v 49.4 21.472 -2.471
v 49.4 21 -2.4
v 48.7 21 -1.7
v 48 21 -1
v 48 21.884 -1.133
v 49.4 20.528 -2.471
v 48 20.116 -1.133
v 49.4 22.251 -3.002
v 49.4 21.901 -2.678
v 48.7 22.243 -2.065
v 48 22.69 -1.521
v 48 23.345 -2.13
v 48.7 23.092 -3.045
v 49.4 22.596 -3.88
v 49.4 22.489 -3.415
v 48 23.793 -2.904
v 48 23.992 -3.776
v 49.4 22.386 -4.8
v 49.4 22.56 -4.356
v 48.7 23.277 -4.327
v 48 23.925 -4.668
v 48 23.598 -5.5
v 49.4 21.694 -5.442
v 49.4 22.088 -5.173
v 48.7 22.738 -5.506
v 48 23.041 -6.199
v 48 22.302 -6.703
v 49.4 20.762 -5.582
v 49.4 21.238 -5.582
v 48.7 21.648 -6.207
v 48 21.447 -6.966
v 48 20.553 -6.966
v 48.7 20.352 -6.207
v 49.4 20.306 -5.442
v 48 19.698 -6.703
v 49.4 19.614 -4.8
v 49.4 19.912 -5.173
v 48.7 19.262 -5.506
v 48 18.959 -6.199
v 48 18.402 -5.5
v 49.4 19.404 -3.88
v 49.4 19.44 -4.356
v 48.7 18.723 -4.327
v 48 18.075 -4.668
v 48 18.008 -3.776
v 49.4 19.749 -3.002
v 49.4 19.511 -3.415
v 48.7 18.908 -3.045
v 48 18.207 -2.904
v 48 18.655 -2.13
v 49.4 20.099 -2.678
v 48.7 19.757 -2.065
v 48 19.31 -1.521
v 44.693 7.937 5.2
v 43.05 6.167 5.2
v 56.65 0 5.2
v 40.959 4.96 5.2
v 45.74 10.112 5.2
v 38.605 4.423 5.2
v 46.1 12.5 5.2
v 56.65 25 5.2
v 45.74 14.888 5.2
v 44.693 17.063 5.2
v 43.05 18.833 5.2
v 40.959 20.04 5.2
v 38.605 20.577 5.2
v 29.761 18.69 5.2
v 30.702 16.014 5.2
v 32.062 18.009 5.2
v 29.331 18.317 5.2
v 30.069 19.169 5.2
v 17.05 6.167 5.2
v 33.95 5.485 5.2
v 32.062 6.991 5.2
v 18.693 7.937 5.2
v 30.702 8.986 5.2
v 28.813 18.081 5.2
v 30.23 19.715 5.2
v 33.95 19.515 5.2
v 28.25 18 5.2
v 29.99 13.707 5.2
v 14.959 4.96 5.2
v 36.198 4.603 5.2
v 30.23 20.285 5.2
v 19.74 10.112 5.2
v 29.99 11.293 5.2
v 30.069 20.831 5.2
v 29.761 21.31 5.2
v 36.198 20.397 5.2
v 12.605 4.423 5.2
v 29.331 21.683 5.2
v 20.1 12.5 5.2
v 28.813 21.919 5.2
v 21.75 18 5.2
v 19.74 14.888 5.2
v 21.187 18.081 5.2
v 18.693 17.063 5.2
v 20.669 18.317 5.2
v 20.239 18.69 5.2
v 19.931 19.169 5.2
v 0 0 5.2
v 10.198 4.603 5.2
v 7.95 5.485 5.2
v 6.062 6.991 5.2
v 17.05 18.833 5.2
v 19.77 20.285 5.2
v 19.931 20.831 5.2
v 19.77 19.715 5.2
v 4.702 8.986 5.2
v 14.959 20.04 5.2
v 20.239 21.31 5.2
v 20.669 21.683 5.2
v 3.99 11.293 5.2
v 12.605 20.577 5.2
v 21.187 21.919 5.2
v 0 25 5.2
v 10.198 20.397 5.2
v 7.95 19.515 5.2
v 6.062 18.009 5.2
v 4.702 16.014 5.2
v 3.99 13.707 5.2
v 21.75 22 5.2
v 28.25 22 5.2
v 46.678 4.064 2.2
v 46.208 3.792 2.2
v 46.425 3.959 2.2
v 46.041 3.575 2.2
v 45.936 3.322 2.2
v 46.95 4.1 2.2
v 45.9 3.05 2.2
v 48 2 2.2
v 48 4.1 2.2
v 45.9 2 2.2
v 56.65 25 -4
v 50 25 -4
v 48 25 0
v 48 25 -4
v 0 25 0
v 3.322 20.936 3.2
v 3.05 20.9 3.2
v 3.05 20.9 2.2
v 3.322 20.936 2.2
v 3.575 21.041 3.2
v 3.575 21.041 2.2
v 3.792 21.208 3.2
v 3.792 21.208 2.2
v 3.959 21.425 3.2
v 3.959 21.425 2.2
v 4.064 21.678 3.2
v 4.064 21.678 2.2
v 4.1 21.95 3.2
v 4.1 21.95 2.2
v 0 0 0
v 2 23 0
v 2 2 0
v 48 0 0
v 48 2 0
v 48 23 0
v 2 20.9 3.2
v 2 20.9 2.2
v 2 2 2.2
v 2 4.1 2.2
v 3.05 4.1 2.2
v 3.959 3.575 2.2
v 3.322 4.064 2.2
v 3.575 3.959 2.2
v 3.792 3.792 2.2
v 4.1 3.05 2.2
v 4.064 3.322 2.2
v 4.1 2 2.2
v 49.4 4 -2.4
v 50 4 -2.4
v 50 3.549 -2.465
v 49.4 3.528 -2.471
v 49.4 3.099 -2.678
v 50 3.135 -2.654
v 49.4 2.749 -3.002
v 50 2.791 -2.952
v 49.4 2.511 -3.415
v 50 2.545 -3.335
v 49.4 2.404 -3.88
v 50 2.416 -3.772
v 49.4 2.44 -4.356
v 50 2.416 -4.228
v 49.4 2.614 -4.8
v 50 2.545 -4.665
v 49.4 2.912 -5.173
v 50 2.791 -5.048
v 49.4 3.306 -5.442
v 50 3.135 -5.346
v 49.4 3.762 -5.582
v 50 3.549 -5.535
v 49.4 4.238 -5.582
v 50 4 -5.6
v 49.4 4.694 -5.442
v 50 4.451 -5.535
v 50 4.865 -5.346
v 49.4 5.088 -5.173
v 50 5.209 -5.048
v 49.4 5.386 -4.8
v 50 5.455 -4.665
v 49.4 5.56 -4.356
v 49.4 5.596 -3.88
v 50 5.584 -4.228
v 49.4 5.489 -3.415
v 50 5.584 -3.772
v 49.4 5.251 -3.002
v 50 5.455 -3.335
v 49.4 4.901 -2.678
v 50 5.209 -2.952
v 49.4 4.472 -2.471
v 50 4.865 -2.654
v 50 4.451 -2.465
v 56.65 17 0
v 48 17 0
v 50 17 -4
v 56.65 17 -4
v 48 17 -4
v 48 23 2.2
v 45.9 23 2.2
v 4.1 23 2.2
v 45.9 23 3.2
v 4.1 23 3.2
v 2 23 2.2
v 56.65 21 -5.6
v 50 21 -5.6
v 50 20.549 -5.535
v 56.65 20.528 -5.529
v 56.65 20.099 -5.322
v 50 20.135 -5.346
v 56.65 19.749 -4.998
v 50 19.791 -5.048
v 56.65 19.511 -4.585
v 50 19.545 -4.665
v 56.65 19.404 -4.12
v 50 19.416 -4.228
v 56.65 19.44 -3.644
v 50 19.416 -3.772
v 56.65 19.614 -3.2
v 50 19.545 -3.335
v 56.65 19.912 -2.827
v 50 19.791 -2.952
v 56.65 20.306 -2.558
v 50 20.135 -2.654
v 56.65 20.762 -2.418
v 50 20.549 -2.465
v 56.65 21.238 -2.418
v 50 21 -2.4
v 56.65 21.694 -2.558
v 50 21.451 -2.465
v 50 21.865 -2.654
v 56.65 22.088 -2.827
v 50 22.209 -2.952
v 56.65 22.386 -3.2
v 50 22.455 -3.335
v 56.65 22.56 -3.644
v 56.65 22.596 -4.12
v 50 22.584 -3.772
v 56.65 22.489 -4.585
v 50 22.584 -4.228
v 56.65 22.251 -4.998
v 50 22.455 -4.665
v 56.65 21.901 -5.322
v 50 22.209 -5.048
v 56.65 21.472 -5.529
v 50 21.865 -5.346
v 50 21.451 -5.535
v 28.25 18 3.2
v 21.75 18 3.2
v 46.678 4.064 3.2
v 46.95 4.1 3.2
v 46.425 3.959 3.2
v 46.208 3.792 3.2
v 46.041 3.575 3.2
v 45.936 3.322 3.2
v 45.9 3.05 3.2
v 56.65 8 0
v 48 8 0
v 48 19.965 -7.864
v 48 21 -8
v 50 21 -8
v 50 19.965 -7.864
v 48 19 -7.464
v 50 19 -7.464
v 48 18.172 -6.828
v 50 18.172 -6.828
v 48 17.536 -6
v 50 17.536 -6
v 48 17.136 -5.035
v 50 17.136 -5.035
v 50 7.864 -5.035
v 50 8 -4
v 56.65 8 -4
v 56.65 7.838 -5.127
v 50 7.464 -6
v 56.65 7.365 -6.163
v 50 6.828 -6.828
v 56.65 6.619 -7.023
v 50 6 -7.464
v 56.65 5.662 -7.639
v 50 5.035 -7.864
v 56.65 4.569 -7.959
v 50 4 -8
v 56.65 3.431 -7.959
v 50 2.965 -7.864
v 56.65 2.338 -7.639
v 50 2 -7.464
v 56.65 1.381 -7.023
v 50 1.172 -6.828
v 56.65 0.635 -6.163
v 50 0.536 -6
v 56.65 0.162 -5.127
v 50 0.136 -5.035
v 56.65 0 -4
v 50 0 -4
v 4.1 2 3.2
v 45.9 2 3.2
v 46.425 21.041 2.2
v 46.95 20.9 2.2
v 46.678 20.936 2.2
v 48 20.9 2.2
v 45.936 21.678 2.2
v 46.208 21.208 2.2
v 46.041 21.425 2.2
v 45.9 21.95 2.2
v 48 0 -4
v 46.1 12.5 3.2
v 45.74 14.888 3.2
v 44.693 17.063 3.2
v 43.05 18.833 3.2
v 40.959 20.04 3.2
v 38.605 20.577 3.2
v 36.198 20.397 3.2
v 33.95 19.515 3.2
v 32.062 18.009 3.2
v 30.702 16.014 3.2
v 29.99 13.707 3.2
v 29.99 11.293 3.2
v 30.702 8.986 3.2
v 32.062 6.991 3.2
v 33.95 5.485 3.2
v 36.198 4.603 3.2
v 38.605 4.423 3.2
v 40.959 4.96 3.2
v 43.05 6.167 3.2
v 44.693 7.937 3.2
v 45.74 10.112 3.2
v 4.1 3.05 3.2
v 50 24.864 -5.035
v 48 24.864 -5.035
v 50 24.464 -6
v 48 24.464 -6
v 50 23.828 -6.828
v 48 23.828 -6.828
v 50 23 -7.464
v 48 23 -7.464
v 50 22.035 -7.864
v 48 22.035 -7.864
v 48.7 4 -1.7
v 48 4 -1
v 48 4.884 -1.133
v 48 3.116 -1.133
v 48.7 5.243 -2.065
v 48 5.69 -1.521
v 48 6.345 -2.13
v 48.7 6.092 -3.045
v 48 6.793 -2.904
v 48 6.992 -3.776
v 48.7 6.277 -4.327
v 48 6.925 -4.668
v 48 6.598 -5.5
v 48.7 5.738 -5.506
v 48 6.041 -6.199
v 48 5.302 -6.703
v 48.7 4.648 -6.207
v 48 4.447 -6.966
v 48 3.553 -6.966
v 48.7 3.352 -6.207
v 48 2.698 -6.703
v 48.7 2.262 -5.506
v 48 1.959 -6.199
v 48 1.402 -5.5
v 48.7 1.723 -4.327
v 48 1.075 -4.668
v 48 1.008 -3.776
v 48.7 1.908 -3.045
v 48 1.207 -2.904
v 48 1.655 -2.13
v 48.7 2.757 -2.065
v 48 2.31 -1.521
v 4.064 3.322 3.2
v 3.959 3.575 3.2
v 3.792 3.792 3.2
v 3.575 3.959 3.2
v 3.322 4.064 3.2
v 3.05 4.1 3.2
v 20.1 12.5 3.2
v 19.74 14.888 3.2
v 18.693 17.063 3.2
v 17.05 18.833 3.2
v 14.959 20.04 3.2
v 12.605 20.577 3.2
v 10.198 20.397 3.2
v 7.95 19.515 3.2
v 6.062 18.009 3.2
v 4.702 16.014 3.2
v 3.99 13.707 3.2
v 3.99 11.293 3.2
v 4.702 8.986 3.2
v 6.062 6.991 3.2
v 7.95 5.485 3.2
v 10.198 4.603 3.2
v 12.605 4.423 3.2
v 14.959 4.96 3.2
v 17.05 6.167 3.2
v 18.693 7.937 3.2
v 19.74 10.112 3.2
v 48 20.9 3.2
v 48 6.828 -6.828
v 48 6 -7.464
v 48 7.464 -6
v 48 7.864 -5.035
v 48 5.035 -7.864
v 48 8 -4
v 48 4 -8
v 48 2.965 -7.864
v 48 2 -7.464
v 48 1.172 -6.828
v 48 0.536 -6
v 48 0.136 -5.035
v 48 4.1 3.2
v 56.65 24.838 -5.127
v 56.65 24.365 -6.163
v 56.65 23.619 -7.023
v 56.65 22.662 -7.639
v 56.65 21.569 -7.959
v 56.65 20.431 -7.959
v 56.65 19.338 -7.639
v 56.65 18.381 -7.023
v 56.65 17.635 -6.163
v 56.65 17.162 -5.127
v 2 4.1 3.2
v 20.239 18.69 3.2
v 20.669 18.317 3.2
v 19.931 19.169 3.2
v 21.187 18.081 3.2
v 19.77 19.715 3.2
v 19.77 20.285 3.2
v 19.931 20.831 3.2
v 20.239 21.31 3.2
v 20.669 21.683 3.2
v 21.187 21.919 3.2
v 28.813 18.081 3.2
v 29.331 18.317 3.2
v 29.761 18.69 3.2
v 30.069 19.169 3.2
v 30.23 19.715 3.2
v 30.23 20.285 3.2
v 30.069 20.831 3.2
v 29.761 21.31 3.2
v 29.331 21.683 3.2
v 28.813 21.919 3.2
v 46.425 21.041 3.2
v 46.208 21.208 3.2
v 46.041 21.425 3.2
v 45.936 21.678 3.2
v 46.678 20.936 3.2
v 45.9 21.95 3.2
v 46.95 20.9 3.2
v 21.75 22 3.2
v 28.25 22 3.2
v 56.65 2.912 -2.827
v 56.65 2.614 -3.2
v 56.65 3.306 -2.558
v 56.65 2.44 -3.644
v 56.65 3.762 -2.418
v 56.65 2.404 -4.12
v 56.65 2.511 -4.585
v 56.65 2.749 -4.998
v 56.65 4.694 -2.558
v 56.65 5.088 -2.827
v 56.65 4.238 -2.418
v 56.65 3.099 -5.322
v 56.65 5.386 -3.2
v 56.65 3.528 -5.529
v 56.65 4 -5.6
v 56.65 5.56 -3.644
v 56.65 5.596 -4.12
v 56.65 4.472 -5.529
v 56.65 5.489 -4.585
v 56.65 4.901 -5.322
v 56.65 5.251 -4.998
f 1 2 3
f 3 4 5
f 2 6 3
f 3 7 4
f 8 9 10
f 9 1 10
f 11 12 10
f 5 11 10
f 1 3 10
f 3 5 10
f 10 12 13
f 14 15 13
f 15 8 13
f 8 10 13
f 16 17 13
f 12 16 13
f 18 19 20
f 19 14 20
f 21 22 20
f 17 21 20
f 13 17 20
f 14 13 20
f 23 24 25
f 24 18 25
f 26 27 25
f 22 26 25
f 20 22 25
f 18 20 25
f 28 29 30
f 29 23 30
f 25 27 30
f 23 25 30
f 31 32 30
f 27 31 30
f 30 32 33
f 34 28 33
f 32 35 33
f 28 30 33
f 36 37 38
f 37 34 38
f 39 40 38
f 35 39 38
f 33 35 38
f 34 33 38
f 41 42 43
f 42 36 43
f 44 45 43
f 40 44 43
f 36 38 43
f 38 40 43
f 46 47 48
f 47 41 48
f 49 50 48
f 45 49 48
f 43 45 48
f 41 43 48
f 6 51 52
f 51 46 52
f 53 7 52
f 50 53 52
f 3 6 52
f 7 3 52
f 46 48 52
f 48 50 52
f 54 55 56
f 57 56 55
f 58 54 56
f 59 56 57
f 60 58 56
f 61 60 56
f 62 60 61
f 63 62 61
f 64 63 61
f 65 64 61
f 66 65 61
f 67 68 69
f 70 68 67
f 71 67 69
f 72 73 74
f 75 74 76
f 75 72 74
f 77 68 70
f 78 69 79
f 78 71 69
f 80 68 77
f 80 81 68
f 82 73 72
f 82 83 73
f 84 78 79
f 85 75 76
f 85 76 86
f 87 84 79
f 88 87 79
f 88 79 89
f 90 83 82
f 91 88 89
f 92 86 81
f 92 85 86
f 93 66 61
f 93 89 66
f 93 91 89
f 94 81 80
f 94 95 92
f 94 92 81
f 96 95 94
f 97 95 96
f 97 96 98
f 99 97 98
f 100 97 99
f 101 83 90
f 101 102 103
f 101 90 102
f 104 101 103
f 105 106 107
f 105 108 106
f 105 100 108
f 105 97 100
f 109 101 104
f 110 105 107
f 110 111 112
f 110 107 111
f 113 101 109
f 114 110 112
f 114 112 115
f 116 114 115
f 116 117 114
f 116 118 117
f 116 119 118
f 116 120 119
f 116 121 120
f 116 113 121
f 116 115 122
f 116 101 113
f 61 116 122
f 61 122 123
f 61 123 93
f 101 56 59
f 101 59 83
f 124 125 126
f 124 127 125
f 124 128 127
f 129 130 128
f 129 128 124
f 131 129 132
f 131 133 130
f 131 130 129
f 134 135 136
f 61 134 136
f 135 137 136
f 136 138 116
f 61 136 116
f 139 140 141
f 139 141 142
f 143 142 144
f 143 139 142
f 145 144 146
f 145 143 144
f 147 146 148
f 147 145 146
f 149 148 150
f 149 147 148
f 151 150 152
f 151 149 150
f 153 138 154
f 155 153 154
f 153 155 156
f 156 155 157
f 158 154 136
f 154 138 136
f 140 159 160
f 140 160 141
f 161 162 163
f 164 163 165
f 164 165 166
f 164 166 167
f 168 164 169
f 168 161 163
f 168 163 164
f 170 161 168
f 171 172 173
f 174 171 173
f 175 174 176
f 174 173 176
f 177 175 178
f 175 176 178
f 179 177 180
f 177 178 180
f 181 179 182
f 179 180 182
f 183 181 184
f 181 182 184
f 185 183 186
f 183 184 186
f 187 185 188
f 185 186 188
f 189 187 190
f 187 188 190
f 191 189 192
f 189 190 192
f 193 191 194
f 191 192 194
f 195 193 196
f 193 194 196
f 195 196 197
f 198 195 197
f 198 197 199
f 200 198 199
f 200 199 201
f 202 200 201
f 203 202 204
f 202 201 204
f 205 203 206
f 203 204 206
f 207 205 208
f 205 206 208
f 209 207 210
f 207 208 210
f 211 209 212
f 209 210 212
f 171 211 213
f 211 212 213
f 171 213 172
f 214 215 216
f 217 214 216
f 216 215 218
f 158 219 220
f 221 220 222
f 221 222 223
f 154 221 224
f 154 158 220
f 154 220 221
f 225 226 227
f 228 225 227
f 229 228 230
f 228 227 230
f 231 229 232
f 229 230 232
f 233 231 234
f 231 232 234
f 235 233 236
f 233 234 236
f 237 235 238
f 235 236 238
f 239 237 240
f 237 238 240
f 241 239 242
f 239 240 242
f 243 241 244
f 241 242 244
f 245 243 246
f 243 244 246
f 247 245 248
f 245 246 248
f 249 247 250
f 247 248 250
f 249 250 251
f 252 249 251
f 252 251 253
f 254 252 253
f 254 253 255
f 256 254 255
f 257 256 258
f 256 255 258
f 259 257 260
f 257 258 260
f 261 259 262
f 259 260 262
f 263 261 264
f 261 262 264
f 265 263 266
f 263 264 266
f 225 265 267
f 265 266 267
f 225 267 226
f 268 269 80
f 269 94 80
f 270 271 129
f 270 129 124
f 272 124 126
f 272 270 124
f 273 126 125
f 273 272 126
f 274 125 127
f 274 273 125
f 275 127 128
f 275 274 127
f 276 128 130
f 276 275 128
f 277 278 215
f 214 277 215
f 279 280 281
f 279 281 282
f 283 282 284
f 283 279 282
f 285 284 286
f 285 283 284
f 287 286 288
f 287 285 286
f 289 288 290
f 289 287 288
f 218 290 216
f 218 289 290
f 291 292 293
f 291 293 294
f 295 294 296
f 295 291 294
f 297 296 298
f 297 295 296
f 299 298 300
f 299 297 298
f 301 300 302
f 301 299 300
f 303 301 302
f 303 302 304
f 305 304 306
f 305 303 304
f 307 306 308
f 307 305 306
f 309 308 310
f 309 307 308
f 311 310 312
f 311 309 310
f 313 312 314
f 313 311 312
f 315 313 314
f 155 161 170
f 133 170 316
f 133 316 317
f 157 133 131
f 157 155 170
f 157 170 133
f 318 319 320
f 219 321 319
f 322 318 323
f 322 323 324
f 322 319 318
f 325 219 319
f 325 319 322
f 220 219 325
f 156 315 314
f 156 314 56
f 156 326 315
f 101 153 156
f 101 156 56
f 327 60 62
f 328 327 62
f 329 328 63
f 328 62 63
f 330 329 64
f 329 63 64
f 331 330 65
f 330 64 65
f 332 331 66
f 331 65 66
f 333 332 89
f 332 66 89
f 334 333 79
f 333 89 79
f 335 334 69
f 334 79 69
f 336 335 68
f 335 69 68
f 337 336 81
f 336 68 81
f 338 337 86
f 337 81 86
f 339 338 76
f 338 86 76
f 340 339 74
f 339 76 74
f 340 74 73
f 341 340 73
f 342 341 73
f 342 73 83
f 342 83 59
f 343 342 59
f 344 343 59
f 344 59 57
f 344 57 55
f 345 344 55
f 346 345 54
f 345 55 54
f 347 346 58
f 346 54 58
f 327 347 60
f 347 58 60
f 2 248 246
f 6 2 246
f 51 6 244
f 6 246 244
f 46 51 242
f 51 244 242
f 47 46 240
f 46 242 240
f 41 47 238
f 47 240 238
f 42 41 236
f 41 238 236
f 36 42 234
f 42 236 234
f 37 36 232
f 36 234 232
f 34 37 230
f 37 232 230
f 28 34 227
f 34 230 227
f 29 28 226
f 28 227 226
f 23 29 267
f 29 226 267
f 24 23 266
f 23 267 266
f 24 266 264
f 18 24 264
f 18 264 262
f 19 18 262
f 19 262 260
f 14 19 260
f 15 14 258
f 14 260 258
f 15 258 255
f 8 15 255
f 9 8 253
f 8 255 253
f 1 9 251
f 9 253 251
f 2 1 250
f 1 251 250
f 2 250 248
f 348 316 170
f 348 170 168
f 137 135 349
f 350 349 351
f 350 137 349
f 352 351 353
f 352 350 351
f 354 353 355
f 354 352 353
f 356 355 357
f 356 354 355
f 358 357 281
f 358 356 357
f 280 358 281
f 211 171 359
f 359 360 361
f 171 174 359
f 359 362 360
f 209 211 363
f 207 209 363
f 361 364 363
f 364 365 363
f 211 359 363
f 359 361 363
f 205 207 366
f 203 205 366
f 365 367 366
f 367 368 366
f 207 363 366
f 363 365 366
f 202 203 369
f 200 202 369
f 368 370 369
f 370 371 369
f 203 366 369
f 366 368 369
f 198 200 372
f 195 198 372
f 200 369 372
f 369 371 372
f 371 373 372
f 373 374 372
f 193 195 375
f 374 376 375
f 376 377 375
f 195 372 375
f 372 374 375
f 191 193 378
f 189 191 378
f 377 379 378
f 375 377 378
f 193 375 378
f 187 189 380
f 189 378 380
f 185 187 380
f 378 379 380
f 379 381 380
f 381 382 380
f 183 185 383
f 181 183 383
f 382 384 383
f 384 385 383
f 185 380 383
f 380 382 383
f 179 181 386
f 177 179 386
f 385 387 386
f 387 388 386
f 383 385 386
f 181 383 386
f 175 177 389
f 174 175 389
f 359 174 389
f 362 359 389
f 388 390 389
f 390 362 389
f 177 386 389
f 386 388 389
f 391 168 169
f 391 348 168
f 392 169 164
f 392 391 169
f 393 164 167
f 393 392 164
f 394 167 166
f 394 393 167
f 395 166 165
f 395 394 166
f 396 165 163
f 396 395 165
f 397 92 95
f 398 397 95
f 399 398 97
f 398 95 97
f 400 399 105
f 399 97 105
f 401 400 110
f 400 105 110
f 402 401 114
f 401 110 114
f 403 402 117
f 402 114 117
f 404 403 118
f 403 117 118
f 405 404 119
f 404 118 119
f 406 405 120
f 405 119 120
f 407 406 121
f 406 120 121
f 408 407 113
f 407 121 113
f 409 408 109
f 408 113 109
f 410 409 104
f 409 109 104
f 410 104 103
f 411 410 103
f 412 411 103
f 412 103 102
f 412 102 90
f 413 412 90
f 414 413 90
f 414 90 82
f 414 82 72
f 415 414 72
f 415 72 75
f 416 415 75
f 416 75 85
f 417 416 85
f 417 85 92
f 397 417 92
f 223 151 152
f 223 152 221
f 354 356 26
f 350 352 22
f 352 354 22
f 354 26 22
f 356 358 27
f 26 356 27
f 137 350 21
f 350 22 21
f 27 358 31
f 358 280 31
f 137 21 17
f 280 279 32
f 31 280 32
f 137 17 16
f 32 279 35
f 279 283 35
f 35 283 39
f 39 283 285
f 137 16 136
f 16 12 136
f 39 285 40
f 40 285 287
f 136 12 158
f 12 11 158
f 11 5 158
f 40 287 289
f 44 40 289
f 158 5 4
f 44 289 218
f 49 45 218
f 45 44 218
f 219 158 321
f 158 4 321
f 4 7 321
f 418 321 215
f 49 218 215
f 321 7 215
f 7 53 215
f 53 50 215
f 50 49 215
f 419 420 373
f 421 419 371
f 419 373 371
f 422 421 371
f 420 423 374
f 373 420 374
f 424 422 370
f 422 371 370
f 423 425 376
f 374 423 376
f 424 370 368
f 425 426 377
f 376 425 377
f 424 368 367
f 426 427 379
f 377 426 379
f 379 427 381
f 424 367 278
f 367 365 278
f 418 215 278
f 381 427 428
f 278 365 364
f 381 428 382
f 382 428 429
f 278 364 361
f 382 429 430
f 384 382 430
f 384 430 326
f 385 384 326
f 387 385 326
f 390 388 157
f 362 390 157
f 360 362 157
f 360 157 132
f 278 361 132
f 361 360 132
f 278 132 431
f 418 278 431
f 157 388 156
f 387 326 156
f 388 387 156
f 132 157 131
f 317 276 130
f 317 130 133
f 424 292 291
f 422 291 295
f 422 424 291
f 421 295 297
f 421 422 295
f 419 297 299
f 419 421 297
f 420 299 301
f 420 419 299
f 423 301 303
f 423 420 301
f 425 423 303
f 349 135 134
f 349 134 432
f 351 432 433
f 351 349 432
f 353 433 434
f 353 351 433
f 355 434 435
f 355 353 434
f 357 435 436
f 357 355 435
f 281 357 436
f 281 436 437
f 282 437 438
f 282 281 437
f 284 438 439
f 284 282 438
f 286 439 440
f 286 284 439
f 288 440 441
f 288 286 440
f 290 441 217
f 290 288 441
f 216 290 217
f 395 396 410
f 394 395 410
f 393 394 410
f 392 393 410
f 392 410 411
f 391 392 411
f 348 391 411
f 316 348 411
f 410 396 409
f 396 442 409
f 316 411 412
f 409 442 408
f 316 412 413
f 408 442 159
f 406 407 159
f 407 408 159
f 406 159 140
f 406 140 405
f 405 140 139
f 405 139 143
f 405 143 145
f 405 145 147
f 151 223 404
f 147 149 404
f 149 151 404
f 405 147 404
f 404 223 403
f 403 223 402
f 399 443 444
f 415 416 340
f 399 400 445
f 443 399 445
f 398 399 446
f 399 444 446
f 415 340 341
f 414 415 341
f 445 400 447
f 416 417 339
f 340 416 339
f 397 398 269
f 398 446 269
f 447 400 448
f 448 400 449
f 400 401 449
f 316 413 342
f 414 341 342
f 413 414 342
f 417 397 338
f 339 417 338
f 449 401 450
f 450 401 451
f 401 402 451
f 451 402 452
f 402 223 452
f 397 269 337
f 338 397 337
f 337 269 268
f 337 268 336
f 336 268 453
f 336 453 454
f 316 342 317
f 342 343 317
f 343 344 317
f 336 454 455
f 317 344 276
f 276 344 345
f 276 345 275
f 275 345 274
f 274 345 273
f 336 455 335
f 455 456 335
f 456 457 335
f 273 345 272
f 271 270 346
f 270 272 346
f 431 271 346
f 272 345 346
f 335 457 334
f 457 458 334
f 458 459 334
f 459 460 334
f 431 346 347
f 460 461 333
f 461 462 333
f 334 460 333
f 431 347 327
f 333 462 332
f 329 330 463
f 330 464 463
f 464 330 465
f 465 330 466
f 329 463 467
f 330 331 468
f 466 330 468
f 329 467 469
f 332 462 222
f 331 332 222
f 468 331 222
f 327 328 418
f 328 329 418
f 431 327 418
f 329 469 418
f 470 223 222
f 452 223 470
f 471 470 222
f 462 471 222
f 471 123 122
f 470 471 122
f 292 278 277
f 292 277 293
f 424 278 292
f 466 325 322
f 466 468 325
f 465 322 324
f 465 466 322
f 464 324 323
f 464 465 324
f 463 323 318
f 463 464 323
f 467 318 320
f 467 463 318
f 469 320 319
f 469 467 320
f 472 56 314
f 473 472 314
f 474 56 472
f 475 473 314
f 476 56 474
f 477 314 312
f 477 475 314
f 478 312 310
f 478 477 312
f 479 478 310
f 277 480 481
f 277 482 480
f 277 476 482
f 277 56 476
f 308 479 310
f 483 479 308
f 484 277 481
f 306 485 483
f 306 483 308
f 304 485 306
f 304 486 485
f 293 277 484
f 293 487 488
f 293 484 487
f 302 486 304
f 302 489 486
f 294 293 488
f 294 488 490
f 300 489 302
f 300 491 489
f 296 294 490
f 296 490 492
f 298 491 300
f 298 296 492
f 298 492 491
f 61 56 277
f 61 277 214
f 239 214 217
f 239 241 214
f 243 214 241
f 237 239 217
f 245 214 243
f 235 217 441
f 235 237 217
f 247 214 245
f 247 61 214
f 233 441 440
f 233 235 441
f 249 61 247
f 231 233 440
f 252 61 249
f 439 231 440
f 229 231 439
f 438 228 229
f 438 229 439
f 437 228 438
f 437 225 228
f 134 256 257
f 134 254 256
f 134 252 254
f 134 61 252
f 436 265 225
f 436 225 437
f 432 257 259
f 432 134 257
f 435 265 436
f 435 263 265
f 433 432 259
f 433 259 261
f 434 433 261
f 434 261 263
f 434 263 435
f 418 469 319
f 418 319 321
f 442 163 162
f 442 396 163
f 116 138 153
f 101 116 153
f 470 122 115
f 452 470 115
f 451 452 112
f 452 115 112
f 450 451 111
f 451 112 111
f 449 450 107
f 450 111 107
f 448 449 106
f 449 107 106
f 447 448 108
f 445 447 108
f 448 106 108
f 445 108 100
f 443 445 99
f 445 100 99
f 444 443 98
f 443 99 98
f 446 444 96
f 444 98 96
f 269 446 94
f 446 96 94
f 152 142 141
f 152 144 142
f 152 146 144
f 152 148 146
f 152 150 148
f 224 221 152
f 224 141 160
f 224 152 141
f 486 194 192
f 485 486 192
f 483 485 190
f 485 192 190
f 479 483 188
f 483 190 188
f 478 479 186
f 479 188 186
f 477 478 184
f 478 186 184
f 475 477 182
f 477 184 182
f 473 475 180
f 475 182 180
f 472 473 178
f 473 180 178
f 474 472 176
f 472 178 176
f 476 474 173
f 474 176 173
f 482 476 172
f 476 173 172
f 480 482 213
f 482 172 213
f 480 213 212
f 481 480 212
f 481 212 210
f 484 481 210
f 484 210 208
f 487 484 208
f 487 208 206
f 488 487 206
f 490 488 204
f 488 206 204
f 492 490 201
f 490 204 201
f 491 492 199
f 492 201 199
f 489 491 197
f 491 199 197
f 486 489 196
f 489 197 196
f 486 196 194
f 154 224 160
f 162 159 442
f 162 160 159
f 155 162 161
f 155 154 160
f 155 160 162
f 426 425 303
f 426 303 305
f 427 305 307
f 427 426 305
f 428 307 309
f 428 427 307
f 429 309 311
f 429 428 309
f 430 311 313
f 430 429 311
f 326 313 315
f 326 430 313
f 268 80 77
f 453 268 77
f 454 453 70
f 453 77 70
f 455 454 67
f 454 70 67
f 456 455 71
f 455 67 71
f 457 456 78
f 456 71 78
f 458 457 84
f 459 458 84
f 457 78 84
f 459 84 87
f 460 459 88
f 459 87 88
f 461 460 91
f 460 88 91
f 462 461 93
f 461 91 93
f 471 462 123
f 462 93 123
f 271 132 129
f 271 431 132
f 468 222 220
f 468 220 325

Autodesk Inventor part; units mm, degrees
sketch "Эскиз1" plane through (0, 0, 0) normal (0, 0, 1) x (1, 0, 0)
  line L0 (0, 0) -> (50, 0)
  line L1 (50, 0) -> (50, 25)
  line L2 (50, 25) -> (0, 25)
  line L3 (0, 25) -> (0, 0)
  dimension "d0" = 50
  dimension "d1" = 25
extrude "Выдавливание1" add sketch "Эскиз1" along normal blind 5.2
shell "Оболочка1" thickness 2 removed faces 1 at (16.6667, 16.6667, 0)
sketch "Эскиз2" plane through (0, 0, 5.2) normal (0, 0, 1) x (1, 0, 0)
  line L0 (50, 25) -> (0, 25) projected
  line L1 (25, 25) -> (25, 0)
  line L2 (0, 0) -> (50, 0) projected
  line L3 (25, 12.5) -> (12, 12.5)
  line L4 (0, 25) -> (0, 0) projected
  circle A0 centre (12, 12.5) radius 8.1
  circle A1 centre (38, 12.5) radius 8.1
  line L5 (25, 25) -> (25, 20)
  line L6 (21.75, 20) -> (28.25, 20) construction
  line L7 (21.75, 18) -> (28.25, 18)
  line L8 (28.25, 22) -> (21.75, 22)
  arc A2 (21.75, 22) -> (21.75, 18) centre (21.75, 20) ccw
  arc A3 (28.25, 18) -> (28.25, 22) centre (28.25, 20) ccw
  point P0 (25, 18)
  point P1 (25, 22)
  dimension "d5" = 13
  dimension "d6" = 16.2
  dimension "d9" = 5
  dimension "d10" = 3.25
  dimension "d11" = 4
extrude "Выдавливание2" cut sketch "Эскиз2" against normal through all contours L8 A3 L7 L1 | L1 L7 A2 L8 | A0 | A1
sketch "Эскиз5" plane through (48, 23, 3.2) normal (0, 0, -1) x (-1, 0, 0)
  line L0 (0, 0) -> (1.05, 0)
  line L1 (0, 0) -> (46, 0) projected
  line L2 (1.05, 0) -> (1.05, -1.05)
  circle A0 centre (1.05, -1.05) radius 1.05
  line L3 (2.1, -2.1) -> (0, -2.1)
  line L4 (0, -2.1) -> (0, 0)
  line L5 (0, 0) -> (2.1, 0)
  line L6 (2.1, 0) -> (2.1, -2.1)
  line L7 (2.1, -2.1) -> (0, 0) construction
  line L8 (0, -2.1) -> (2.1, 0) construction
  point P0 (48, -23)
  point P1 (1.05, -2.1)
  point P2 (2.1, -1.05)
  dimension "d17" = 1.05
  dimension "d18" = 1.05
extrude "Выдавливание4" add sketch "Эскиз5" along normal blind 1 contours L0 A0 L4 | L1 L6 A0 | A0 | A0 L3 L4
ref_plane "РабПлоскость1" through (25, 2, 0) normal (1, 0, 0) x (0, 0, -1)
ref_plane "РабПлоскость2" through (2, 12.5, 0) normal (0, -1, 0) x (1, 0, 0)
mirror "Зеркальное отражение1" about plane through (2, 12.5, 0) normal (0, -1, 0) of "Выдавливание4"
mirror "Зеркальное отражение2" about plane through (25, 2, 0) normal (1, 0, 0) of "Выдавливание4", "Зеркальное отражение1"
sketch "Эскиз11" plane through (50, 25, 5.2) normal (1, 0, 0) x (0, 0, -1)
  line L0 (5.2, 0) -> (13.2, 0)
  line L1 (13.2, 0) -> (13.2, -8)
  line L2 (13.2, -8) -> (5.2, -8)
  line L3 (5.2, -8) -> (5.2, 0)
  point P0 (5.2, -25)
  dimension "d53" = 8
  dimension "d54" = 8
extrude "Выдавливание8" add sketch "Эскиз11" against normal blind 2
sketch "Эскиз12" plane through (48, 23, 0) normal (-1, 0, 0) x (0, 0, 1)
  line L0 (-8, -6) -> (0, -6) projected
  line L1 (-4, -6) -> (-4, 2)
  point P0 (0, -23)
  point P1 (-4, -2)
hole "Отверстие3" at (48, 21, -4) direction (1, 0, 0) diameter 3.2 end through all countersink diameter 6 countersink angle 90
ref_plane "РабПлоскость6" through (0, 12.5, 5.2) normal (0, 1, 0) x (1, 0, 0)
mirror "Зеркальное отражение5" about plane through (0, 12.5, 5.2) normal (0, 1, 0) of "Выдавливание8", "Отверстие3"
fillet "Сопряжение3" radius 4 4 edges at (49, 25, -8) (49, 17, -8) (49, 0, -8) (49, 8, -8)
sketch "Эскиз13" plane through (50, 0, 5.2) normal (1, 0, 0) x (0, 0, -1)
  arc A0 (9.2, 0) -> (9.2, 8) centre (9.2, 4) ccw projected
  line L0 (5.2, 8) -> (9.2, 8) projected
  line L1 (5.2, 8) -> (5.2, 17) projected
  line L2 (5.2, 17) -> (9.2, 17) projected
  arc A1 (9.2, 17) -> (9.2, 25) centre (9.2, 21) ccw projected
  line L3 (9.2, 25) -> (0, 25) projected
  line L4 (0, 0) -> (0, 25) projected
  line L5 (9.2, 0) -> (0, 0) projected
  circle A2 centre (9.2, 21) radius 1.6 projected
  circle A3 centre (9.2, 4) radius 1.6 projected
  point P0 (5.2, 0)
extrude "Выдавливание9" add sketch "Эскиз13" along normal blind 6.65
properties part number "Крепление ультрасоника вертикальная"
